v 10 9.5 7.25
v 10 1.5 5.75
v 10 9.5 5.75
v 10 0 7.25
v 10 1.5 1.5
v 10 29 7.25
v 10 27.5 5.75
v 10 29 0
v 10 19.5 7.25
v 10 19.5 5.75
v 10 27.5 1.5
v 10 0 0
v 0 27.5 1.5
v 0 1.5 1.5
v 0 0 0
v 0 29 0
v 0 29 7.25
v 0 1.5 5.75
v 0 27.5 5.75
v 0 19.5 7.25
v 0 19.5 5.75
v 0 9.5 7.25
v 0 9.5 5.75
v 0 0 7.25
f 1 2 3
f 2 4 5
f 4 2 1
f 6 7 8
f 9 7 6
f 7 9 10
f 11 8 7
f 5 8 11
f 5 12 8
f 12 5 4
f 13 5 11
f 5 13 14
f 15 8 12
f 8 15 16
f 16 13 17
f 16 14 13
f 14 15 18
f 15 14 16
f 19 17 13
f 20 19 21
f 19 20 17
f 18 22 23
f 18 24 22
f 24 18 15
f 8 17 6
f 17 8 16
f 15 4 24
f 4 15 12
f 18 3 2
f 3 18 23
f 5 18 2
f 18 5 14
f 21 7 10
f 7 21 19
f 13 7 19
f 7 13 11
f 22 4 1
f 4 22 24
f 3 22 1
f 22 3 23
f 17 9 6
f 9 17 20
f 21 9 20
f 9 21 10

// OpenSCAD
length=10; //length of clip
//width=23; //width for sternum strap
width=29; //width for shoulder strap
wall_thickness=1.5; //wall thickness
gap_height=2.75; //height of gap
clip_entrance_width=width/2-5; //clip entrance

cube([length,width,wall_thickness]);
translate([0,0,wall_thickness])
    cube([length,wall_thickness,gap_height+wall_thickness]);
translate([0,width-wall_thickness,wall_thickness])
    cube([length,wall_thickness,gap_height+wall_thickness]);
translate([0,0,gap_height+2*wall_thickness])
    cube([length,clip_entrance_width,wall_thickness]);
translate([0,width-clip_entrance_width,gap_height+wall_thickness+wall_thickness])
    cube([length,clip_entrance_width,wall_thickness]);
